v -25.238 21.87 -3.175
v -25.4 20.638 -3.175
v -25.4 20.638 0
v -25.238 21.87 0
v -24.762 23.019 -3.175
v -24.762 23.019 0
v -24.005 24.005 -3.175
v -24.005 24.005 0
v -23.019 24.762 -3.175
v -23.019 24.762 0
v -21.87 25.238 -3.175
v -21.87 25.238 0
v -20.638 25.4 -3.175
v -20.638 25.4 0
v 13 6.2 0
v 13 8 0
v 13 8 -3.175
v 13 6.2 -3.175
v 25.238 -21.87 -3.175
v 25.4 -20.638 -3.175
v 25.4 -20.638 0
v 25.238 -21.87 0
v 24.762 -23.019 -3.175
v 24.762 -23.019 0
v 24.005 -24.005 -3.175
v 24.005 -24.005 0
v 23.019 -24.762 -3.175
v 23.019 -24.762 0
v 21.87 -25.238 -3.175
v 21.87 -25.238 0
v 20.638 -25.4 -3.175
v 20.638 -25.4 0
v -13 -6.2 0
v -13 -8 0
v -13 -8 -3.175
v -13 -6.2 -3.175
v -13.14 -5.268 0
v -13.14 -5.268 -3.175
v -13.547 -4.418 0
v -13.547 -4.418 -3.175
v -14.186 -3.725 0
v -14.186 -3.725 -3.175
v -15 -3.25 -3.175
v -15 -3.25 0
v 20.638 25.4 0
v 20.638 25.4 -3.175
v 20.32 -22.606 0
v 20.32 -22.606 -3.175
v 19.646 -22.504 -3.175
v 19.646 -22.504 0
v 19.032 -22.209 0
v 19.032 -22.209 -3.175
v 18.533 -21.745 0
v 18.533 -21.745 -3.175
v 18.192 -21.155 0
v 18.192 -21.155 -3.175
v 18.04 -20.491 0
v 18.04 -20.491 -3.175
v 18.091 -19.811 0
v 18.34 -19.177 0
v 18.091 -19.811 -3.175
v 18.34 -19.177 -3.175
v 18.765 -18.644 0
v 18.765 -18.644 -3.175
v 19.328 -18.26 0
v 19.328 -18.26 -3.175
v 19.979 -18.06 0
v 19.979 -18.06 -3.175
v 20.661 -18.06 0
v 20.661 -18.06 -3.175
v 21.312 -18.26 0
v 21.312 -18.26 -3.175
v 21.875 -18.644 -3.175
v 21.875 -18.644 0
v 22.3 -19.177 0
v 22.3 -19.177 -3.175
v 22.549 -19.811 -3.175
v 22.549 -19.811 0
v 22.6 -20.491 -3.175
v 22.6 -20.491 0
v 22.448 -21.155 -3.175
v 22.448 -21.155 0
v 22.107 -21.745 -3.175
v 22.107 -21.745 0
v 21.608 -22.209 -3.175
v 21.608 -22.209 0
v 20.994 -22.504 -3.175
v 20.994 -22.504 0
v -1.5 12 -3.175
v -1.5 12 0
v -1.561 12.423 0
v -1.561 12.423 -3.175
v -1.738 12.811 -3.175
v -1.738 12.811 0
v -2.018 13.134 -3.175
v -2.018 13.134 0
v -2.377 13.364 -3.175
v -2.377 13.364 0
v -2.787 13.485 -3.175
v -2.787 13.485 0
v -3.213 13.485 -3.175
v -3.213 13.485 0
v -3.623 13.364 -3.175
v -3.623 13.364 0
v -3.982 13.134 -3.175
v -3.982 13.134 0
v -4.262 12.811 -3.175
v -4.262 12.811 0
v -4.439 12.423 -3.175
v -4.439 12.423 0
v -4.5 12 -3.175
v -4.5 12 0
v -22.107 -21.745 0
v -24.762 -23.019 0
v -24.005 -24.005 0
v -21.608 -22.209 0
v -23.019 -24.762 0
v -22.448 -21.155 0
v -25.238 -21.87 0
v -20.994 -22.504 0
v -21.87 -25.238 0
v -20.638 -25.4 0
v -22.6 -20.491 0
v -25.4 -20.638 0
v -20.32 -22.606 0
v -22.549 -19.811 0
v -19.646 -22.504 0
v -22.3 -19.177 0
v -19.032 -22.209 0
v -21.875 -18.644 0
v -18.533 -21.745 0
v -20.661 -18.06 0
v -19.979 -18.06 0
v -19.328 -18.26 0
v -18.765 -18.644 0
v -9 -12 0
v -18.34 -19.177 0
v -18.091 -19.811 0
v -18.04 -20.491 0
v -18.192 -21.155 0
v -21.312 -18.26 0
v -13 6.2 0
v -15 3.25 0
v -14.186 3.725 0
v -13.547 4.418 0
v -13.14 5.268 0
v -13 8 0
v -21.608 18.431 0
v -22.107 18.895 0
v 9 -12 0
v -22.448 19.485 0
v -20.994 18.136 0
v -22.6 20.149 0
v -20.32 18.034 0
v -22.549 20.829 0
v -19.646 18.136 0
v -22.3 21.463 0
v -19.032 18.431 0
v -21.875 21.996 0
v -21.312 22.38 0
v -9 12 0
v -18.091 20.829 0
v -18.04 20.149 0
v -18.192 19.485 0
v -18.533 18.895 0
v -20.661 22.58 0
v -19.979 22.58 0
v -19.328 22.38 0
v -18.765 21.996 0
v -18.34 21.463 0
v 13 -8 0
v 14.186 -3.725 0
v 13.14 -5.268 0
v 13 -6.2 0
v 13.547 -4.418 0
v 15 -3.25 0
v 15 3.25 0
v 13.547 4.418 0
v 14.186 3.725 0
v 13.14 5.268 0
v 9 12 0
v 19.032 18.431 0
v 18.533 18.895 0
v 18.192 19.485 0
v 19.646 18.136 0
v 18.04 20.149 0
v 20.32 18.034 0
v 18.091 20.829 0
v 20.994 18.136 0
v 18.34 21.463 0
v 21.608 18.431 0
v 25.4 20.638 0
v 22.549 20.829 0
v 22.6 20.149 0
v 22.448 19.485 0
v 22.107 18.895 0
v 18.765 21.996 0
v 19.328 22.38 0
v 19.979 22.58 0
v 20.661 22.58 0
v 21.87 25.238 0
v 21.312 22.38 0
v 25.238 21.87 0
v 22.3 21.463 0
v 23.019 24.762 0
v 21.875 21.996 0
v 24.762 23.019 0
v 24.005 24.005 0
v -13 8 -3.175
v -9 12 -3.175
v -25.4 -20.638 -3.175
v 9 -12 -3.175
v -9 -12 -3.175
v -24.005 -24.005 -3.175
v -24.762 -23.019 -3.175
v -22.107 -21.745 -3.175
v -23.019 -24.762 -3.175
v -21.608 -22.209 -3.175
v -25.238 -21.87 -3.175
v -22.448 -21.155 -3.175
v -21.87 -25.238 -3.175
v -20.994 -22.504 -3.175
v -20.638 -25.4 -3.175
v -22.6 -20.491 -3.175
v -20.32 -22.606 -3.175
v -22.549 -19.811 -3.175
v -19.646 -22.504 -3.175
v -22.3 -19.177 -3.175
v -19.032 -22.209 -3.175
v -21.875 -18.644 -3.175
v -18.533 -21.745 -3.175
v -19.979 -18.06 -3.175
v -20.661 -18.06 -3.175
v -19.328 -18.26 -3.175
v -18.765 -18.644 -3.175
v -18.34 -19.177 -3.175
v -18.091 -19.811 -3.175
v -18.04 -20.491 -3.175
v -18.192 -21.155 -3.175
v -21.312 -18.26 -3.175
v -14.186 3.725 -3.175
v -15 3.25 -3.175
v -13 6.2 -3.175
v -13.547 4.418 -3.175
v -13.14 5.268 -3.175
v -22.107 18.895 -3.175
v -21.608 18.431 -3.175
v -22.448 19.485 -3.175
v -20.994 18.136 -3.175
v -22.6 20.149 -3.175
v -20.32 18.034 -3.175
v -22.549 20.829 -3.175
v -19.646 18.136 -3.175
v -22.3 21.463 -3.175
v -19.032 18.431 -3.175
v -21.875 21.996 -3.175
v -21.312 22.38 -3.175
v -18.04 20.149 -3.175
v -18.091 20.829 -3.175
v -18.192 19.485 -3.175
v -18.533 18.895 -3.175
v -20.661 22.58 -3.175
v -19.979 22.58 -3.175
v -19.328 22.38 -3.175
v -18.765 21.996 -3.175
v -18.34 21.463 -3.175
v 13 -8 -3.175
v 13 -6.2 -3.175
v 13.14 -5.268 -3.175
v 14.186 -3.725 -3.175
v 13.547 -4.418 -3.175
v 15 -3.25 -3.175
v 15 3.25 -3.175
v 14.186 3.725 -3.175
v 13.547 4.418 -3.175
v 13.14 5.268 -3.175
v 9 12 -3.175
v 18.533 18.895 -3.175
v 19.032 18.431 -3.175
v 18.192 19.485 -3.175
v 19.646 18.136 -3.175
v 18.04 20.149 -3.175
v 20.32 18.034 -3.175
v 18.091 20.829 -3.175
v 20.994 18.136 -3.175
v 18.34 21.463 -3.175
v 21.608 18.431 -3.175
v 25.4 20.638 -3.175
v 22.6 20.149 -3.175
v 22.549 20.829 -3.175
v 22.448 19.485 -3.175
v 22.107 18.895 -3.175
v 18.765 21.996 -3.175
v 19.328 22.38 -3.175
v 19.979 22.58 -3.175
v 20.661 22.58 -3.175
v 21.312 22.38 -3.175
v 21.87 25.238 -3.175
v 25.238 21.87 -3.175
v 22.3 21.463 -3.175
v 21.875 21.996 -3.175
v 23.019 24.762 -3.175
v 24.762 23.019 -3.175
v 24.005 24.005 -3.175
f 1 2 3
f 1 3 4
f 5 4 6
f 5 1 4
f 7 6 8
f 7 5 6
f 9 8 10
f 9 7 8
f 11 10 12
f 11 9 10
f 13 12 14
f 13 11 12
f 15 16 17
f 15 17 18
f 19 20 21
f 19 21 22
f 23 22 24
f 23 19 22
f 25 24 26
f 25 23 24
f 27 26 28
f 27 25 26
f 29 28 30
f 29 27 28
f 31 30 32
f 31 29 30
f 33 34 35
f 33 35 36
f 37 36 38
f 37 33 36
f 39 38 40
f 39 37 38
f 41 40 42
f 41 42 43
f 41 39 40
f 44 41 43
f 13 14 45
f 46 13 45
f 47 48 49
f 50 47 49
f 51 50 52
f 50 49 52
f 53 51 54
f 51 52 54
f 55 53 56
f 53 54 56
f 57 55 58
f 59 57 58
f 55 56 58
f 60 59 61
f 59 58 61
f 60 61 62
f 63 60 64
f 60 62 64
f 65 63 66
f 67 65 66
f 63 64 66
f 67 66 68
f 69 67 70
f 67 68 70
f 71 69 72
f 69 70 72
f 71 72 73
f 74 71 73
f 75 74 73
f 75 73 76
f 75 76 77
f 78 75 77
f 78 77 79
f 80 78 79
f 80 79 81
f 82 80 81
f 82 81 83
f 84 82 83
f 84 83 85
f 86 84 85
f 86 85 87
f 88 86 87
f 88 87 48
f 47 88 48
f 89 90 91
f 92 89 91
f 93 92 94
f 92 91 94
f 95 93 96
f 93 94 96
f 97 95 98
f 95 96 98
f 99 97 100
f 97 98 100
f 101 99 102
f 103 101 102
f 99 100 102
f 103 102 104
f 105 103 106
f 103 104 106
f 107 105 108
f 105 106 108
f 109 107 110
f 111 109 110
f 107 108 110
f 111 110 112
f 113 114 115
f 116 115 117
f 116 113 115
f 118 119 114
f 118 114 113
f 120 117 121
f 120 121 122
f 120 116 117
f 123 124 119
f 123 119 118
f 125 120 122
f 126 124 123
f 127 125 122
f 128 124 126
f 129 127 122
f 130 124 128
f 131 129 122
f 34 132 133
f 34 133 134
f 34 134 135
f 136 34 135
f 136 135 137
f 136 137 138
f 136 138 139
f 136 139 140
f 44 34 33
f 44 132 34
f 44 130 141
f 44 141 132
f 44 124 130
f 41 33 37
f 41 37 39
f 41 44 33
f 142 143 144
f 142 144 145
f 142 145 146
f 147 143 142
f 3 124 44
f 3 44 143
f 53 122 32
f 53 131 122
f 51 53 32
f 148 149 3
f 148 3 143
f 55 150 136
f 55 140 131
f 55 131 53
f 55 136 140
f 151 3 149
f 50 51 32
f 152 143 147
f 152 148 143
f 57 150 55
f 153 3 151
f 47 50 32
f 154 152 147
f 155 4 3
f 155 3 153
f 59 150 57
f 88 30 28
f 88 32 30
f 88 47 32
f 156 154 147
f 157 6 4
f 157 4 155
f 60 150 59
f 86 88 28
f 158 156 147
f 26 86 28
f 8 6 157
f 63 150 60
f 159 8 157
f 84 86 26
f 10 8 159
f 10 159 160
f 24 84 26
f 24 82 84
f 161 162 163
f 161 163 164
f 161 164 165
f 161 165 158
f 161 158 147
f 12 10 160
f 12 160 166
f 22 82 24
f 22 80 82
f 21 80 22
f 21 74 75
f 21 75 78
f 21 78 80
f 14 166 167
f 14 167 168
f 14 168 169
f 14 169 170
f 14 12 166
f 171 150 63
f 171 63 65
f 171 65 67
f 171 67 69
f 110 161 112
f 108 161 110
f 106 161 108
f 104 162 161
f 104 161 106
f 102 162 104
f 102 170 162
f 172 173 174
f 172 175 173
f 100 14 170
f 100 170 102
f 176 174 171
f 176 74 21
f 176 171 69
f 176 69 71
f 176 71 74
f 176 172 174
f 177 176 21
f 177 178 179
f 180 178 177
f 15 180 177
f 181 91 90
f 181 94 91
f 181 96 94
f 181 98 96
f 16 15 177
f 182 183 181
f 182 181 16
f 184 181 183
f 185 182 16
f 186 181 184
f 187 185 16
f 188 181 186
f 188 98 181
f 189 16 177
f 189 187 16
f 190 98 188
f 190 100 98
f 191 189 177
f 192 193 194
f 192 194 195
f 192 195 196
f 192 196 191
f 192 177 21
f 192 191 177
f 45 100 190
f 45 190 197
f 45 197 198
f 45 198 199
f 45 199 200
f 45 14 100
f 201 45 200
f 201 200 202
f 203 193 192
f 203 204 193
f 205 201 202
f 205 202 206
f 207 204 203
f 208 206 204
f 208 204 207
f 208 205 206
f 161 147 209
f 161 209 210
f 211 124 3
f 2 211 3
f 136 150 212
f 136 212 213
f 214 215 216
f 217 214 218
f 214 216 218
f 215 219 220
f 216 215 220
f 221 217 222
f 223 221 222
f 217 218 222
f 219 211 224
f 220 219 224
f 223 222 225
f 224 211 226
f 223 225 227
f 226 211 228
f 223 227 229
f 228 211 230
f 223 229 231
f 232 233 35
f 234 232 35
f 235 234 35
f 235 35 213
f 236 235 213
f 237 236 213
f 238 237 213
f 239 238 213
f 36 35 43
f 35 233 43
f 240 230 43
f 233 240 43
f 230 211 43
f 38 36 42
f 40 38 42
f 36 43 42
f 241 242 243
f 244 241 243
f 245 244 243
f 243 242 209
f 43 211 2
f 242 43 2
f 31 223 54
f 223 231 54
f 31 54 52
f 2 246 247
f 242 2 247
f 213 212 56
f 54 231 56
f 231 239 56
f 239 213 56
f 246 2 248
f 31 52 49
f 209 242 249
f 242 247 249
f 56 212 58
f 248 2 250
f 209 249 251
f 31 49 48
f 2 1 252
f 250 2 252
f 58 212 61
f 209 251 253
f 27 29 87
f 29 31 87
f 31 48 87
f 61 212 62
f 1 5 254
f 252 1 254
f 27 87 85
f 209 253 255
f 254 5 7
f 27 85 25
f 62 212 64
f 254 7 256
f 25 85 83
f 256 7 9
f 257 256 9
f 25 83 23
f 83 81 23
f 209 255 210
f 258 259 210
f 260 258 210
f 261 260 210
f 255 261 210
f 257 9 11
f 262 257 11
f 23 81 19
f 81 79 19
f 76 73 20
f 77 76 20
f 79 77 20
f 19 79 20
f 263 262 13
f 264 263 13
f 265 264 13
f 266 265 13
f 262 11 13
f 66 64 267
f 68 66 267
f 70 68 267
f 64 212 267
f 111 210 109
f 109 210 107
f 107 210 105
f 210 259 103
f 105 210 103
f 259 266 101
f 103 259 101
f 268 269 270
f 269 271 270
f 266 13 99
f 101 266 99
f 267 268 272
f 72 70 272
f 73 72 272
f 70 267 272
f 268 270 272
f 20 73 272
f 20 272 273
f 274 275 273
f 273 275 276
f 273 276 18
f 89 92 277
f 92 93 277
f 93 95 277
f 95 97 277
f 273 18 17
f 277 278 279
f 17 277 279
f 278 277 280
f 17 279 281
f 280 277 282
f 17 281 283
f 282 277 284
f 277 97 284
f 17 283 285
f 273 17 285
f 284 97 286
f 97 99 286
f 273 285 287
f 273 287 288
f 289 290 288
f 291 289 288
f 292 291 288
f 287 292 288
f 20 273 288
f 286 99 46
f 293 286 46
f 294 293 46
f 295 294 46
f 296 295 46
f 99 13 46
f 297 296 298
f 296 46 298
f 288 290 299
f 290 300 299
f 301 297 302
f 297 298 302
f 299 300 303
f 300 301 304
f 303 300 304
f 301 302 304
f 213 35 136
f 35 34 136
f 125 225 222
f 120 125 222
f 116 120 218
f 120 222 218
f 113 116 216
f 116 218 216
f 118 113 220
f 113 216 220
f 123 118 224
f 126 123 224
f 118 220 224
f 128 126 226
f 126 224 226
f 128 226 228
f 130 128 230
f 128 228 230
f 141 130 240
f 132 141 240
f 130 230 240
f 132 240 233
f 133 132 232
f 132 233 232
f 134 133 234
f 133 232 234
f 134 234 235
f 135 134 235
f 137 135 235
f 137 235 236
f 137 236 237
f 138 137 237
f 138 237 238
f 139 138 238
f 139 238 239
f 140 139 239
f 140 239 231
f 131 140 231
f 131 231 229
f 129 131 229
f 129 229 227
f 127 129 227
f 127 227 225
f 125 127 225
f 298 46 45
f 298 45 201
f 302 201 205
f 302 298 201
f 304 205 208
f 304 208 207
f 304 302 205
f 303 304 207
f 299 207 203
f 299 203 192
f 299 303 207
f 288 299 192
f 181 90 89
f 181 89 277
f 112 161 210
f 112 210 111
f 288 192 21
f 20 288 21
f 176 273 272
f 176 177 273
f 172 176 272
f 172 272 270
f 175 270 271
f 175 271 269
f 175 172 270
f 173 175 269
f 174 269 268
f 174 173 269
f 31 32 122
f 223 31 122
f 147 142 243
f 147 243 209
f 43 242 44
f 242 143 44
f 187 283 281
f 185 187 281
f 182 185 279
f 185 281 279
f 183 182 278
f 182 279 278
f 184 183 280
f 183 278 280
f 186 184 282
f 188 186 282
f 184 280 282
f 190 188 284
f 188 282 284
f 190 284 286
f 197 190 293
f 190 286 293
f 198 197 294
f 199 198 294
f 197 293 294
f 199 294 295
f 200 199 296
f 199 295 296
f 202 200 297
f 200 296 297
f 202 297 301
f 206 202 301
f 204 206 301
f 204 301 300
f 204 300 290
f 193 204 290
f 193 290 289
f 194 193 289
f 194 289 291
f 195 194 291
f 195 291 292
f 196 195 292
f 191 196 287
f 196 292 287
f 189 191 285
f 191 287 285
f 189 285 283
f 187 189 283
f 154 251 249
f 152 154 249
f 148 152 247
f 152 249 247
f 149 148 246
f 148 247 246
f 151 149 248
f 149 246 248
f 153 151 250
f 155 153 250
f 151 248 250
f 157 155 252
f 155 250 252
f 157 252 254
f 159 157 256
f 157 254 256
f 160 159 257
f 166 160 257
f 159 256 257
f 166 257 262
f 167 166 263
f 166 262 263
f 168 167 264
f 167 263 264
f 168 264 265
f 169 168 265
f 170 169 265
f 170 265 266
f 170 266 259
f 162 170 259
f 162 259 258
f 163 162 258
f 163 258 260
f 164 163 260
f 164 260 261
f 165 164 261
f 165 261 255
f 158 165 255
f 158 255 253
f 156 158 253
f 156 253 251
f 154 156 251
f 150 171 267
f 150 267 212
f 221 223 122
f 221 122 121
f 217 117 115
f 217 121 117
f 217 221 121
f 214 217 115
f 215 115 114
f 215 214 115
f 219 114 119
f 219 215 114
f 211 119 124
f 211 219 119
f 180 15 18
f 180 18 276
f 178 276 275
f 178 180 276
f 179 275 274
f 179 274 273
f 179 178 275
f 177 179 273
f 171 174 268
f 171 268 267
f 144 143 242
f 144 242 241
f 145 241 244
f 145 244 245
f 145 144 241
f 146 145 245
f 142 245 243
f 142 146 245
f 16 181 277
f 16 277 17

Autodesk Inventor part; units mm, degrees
ref_plane "YZ Plane" through (0, 0, 0) normal (1, 0, 0) x (0, 1, 0)
ref_plane "XZ Plane" through (0, 0, 0) normal (0, 1, 0) x (-1, 0, 0)
ref_plane "XY Plane" through (0, 0, 0) normal (0, 0, 1) x (1, 0, 0)
sketch "Sketch1" plane through (0, 0, 0) normal (0, 0, 1) x (1, 0, 0)
  line L0 (-13, 12) -> (13, 12)
  line L1 (13, 12) -> (13, -12)
  line L2 (13, -12) -> (-13, -12)
  line L3 (-13, -12) -> (-13, 12)
  line L4 (-13, 3.25) -> (-15, 3.25)
  line L5 (-15, 3.25) -> (-15, -3.25)
  line L6 (-15, -3.25) -> (-13, -3.25)
  line L7 (-13, -3.25) -> (-13, 3.25)
  line L8 (13, 3.25) -> (15, 3.25)
  line L9 (15, 3.25) -> (15, -3.25)
  line L10 (15, -3.25) -> (13, -3.25)
  line L11 (13, -3.25) -> (13, 3.25)
  line L12 (-25.4, 25.4) -> (25.4, 25.4)
  line L13 (25.4, 25.4) -> (25.4, -25.4)
  line L14 (25.4, -25.4) -> (-25.4, -25.4)
  line L15 (-25.4, -25.4) -> (-25.4, 25.4)
  circle A0 centre (0, 0) radius 7.1437
  circle A1 centre (-3, 12) radius 1.5
  line L16 (-13, 8) -> (-9, 12)
  line L17 (9, 12) -> (13, 8)
  line L18 (13, -8) -> (9, -12)
  line L19 (-13, -8) -> (-9, -12)
  point P0 (-14, 3.25)
  point P1 (14, 3.25)
  point P2 (-14, -3.25)
  point P3 (14, -3.25)
  point P4 (-20.32, 20.32)
  point P5 (20.32, 20.32)
  point P6 (20.32, -20.32)
  point P7 (-20.32, -20.32)
  dimension "d0" = 24
  dimension "d1" = 12
  dimension "d2" = 26
  dimension "d3" = 13
  dimension "d4" = 2
  dimension "d5" = 6.5
  dimension "d6" = 3.25
  dimension "d7" = 2
  dimension "d8" = 14.2875
  dimension "d9" = 50.8
  dimension "d10" = 25.4
  dimension "d11" = 50.8
  dimension "d12" = 25.4
  dimension "d13" = 3
  dimension "d14" = 10
  dimension "d15" = 4
  dimension "d16" = 4
  dimension "d17" = 4
  dimension "d18" = 4
  dimension "d19" = 4
  dimension "d20" = 5.08
  dimension "d21" = 5.08
  dimension "d22" = 5.08
  dimension "d23" = 5.08
  dimension "d34" = 40.64
  dimension "d35" = 40.64
extrude "Extrusion1" add sketch "Sketch1" against normal blind 3.175 contours L0 L16 L3 | L0 L1 L17 | L19 L2 L3 | L18 L1 L2 | L12 L13 L14 L15
fillet "Fillet1" radius 3.175 4 edges at (-13, -3.25, -1.5875) (-13, 3.25, -1.5875) (13, 3.25, -1.5875) (13, -3.25, -1.5875)
hole "Hole1" at (-20.32, 20.32, 0) at (20.32, 20.32, 0) at (20.32, -20.32, 0) at (-20.32, -20.32, 0) direction (0, 0, -1) diameter 4.572 end through all
thread "Thread1" size "10-32 UNF" class "2B" standard "ANSI Unified Screw Threads" full length
thread "Thread2" size "10-32 UNF" class "2B" standard "ANSI Unified Screw Threads" full length
thread "Thread3" size "10-32 UNF" class "2B" standard "ANSI Unified Screw Threads" full length
thread "Thread4" size "10-32 UNF" class "2B" standard "ANSI Unified Screw Threads" full length
fillet "Fillet2" radius 4.7625 4 edges at (25.4, 25.4, -1.5875) (25.4, -25.4, -1.5875) (-25.4, 25.4, -1.5875) (-25.4, -25.4, -1.5875)
equation "\"d1\" = 0.5 * d0"
equation "\"d3\" = 0.5 * d2"
equation "\"d6\" = 0.5 * d5"
equation "\"d7\" = d4"
equation "\"d10\" = 0.5 * d9"
equation "\"d12\" = 0.5 * d11"
equation "\"d16\" = d15"
equation "\"d17\" = d15"
equation "\"d18\" = d15"
equation "\"d19\" = d15"
equation "\"d22\" = d21"
equation "\"d23\" = d21"
properties part number "BD gearbox mount block"
